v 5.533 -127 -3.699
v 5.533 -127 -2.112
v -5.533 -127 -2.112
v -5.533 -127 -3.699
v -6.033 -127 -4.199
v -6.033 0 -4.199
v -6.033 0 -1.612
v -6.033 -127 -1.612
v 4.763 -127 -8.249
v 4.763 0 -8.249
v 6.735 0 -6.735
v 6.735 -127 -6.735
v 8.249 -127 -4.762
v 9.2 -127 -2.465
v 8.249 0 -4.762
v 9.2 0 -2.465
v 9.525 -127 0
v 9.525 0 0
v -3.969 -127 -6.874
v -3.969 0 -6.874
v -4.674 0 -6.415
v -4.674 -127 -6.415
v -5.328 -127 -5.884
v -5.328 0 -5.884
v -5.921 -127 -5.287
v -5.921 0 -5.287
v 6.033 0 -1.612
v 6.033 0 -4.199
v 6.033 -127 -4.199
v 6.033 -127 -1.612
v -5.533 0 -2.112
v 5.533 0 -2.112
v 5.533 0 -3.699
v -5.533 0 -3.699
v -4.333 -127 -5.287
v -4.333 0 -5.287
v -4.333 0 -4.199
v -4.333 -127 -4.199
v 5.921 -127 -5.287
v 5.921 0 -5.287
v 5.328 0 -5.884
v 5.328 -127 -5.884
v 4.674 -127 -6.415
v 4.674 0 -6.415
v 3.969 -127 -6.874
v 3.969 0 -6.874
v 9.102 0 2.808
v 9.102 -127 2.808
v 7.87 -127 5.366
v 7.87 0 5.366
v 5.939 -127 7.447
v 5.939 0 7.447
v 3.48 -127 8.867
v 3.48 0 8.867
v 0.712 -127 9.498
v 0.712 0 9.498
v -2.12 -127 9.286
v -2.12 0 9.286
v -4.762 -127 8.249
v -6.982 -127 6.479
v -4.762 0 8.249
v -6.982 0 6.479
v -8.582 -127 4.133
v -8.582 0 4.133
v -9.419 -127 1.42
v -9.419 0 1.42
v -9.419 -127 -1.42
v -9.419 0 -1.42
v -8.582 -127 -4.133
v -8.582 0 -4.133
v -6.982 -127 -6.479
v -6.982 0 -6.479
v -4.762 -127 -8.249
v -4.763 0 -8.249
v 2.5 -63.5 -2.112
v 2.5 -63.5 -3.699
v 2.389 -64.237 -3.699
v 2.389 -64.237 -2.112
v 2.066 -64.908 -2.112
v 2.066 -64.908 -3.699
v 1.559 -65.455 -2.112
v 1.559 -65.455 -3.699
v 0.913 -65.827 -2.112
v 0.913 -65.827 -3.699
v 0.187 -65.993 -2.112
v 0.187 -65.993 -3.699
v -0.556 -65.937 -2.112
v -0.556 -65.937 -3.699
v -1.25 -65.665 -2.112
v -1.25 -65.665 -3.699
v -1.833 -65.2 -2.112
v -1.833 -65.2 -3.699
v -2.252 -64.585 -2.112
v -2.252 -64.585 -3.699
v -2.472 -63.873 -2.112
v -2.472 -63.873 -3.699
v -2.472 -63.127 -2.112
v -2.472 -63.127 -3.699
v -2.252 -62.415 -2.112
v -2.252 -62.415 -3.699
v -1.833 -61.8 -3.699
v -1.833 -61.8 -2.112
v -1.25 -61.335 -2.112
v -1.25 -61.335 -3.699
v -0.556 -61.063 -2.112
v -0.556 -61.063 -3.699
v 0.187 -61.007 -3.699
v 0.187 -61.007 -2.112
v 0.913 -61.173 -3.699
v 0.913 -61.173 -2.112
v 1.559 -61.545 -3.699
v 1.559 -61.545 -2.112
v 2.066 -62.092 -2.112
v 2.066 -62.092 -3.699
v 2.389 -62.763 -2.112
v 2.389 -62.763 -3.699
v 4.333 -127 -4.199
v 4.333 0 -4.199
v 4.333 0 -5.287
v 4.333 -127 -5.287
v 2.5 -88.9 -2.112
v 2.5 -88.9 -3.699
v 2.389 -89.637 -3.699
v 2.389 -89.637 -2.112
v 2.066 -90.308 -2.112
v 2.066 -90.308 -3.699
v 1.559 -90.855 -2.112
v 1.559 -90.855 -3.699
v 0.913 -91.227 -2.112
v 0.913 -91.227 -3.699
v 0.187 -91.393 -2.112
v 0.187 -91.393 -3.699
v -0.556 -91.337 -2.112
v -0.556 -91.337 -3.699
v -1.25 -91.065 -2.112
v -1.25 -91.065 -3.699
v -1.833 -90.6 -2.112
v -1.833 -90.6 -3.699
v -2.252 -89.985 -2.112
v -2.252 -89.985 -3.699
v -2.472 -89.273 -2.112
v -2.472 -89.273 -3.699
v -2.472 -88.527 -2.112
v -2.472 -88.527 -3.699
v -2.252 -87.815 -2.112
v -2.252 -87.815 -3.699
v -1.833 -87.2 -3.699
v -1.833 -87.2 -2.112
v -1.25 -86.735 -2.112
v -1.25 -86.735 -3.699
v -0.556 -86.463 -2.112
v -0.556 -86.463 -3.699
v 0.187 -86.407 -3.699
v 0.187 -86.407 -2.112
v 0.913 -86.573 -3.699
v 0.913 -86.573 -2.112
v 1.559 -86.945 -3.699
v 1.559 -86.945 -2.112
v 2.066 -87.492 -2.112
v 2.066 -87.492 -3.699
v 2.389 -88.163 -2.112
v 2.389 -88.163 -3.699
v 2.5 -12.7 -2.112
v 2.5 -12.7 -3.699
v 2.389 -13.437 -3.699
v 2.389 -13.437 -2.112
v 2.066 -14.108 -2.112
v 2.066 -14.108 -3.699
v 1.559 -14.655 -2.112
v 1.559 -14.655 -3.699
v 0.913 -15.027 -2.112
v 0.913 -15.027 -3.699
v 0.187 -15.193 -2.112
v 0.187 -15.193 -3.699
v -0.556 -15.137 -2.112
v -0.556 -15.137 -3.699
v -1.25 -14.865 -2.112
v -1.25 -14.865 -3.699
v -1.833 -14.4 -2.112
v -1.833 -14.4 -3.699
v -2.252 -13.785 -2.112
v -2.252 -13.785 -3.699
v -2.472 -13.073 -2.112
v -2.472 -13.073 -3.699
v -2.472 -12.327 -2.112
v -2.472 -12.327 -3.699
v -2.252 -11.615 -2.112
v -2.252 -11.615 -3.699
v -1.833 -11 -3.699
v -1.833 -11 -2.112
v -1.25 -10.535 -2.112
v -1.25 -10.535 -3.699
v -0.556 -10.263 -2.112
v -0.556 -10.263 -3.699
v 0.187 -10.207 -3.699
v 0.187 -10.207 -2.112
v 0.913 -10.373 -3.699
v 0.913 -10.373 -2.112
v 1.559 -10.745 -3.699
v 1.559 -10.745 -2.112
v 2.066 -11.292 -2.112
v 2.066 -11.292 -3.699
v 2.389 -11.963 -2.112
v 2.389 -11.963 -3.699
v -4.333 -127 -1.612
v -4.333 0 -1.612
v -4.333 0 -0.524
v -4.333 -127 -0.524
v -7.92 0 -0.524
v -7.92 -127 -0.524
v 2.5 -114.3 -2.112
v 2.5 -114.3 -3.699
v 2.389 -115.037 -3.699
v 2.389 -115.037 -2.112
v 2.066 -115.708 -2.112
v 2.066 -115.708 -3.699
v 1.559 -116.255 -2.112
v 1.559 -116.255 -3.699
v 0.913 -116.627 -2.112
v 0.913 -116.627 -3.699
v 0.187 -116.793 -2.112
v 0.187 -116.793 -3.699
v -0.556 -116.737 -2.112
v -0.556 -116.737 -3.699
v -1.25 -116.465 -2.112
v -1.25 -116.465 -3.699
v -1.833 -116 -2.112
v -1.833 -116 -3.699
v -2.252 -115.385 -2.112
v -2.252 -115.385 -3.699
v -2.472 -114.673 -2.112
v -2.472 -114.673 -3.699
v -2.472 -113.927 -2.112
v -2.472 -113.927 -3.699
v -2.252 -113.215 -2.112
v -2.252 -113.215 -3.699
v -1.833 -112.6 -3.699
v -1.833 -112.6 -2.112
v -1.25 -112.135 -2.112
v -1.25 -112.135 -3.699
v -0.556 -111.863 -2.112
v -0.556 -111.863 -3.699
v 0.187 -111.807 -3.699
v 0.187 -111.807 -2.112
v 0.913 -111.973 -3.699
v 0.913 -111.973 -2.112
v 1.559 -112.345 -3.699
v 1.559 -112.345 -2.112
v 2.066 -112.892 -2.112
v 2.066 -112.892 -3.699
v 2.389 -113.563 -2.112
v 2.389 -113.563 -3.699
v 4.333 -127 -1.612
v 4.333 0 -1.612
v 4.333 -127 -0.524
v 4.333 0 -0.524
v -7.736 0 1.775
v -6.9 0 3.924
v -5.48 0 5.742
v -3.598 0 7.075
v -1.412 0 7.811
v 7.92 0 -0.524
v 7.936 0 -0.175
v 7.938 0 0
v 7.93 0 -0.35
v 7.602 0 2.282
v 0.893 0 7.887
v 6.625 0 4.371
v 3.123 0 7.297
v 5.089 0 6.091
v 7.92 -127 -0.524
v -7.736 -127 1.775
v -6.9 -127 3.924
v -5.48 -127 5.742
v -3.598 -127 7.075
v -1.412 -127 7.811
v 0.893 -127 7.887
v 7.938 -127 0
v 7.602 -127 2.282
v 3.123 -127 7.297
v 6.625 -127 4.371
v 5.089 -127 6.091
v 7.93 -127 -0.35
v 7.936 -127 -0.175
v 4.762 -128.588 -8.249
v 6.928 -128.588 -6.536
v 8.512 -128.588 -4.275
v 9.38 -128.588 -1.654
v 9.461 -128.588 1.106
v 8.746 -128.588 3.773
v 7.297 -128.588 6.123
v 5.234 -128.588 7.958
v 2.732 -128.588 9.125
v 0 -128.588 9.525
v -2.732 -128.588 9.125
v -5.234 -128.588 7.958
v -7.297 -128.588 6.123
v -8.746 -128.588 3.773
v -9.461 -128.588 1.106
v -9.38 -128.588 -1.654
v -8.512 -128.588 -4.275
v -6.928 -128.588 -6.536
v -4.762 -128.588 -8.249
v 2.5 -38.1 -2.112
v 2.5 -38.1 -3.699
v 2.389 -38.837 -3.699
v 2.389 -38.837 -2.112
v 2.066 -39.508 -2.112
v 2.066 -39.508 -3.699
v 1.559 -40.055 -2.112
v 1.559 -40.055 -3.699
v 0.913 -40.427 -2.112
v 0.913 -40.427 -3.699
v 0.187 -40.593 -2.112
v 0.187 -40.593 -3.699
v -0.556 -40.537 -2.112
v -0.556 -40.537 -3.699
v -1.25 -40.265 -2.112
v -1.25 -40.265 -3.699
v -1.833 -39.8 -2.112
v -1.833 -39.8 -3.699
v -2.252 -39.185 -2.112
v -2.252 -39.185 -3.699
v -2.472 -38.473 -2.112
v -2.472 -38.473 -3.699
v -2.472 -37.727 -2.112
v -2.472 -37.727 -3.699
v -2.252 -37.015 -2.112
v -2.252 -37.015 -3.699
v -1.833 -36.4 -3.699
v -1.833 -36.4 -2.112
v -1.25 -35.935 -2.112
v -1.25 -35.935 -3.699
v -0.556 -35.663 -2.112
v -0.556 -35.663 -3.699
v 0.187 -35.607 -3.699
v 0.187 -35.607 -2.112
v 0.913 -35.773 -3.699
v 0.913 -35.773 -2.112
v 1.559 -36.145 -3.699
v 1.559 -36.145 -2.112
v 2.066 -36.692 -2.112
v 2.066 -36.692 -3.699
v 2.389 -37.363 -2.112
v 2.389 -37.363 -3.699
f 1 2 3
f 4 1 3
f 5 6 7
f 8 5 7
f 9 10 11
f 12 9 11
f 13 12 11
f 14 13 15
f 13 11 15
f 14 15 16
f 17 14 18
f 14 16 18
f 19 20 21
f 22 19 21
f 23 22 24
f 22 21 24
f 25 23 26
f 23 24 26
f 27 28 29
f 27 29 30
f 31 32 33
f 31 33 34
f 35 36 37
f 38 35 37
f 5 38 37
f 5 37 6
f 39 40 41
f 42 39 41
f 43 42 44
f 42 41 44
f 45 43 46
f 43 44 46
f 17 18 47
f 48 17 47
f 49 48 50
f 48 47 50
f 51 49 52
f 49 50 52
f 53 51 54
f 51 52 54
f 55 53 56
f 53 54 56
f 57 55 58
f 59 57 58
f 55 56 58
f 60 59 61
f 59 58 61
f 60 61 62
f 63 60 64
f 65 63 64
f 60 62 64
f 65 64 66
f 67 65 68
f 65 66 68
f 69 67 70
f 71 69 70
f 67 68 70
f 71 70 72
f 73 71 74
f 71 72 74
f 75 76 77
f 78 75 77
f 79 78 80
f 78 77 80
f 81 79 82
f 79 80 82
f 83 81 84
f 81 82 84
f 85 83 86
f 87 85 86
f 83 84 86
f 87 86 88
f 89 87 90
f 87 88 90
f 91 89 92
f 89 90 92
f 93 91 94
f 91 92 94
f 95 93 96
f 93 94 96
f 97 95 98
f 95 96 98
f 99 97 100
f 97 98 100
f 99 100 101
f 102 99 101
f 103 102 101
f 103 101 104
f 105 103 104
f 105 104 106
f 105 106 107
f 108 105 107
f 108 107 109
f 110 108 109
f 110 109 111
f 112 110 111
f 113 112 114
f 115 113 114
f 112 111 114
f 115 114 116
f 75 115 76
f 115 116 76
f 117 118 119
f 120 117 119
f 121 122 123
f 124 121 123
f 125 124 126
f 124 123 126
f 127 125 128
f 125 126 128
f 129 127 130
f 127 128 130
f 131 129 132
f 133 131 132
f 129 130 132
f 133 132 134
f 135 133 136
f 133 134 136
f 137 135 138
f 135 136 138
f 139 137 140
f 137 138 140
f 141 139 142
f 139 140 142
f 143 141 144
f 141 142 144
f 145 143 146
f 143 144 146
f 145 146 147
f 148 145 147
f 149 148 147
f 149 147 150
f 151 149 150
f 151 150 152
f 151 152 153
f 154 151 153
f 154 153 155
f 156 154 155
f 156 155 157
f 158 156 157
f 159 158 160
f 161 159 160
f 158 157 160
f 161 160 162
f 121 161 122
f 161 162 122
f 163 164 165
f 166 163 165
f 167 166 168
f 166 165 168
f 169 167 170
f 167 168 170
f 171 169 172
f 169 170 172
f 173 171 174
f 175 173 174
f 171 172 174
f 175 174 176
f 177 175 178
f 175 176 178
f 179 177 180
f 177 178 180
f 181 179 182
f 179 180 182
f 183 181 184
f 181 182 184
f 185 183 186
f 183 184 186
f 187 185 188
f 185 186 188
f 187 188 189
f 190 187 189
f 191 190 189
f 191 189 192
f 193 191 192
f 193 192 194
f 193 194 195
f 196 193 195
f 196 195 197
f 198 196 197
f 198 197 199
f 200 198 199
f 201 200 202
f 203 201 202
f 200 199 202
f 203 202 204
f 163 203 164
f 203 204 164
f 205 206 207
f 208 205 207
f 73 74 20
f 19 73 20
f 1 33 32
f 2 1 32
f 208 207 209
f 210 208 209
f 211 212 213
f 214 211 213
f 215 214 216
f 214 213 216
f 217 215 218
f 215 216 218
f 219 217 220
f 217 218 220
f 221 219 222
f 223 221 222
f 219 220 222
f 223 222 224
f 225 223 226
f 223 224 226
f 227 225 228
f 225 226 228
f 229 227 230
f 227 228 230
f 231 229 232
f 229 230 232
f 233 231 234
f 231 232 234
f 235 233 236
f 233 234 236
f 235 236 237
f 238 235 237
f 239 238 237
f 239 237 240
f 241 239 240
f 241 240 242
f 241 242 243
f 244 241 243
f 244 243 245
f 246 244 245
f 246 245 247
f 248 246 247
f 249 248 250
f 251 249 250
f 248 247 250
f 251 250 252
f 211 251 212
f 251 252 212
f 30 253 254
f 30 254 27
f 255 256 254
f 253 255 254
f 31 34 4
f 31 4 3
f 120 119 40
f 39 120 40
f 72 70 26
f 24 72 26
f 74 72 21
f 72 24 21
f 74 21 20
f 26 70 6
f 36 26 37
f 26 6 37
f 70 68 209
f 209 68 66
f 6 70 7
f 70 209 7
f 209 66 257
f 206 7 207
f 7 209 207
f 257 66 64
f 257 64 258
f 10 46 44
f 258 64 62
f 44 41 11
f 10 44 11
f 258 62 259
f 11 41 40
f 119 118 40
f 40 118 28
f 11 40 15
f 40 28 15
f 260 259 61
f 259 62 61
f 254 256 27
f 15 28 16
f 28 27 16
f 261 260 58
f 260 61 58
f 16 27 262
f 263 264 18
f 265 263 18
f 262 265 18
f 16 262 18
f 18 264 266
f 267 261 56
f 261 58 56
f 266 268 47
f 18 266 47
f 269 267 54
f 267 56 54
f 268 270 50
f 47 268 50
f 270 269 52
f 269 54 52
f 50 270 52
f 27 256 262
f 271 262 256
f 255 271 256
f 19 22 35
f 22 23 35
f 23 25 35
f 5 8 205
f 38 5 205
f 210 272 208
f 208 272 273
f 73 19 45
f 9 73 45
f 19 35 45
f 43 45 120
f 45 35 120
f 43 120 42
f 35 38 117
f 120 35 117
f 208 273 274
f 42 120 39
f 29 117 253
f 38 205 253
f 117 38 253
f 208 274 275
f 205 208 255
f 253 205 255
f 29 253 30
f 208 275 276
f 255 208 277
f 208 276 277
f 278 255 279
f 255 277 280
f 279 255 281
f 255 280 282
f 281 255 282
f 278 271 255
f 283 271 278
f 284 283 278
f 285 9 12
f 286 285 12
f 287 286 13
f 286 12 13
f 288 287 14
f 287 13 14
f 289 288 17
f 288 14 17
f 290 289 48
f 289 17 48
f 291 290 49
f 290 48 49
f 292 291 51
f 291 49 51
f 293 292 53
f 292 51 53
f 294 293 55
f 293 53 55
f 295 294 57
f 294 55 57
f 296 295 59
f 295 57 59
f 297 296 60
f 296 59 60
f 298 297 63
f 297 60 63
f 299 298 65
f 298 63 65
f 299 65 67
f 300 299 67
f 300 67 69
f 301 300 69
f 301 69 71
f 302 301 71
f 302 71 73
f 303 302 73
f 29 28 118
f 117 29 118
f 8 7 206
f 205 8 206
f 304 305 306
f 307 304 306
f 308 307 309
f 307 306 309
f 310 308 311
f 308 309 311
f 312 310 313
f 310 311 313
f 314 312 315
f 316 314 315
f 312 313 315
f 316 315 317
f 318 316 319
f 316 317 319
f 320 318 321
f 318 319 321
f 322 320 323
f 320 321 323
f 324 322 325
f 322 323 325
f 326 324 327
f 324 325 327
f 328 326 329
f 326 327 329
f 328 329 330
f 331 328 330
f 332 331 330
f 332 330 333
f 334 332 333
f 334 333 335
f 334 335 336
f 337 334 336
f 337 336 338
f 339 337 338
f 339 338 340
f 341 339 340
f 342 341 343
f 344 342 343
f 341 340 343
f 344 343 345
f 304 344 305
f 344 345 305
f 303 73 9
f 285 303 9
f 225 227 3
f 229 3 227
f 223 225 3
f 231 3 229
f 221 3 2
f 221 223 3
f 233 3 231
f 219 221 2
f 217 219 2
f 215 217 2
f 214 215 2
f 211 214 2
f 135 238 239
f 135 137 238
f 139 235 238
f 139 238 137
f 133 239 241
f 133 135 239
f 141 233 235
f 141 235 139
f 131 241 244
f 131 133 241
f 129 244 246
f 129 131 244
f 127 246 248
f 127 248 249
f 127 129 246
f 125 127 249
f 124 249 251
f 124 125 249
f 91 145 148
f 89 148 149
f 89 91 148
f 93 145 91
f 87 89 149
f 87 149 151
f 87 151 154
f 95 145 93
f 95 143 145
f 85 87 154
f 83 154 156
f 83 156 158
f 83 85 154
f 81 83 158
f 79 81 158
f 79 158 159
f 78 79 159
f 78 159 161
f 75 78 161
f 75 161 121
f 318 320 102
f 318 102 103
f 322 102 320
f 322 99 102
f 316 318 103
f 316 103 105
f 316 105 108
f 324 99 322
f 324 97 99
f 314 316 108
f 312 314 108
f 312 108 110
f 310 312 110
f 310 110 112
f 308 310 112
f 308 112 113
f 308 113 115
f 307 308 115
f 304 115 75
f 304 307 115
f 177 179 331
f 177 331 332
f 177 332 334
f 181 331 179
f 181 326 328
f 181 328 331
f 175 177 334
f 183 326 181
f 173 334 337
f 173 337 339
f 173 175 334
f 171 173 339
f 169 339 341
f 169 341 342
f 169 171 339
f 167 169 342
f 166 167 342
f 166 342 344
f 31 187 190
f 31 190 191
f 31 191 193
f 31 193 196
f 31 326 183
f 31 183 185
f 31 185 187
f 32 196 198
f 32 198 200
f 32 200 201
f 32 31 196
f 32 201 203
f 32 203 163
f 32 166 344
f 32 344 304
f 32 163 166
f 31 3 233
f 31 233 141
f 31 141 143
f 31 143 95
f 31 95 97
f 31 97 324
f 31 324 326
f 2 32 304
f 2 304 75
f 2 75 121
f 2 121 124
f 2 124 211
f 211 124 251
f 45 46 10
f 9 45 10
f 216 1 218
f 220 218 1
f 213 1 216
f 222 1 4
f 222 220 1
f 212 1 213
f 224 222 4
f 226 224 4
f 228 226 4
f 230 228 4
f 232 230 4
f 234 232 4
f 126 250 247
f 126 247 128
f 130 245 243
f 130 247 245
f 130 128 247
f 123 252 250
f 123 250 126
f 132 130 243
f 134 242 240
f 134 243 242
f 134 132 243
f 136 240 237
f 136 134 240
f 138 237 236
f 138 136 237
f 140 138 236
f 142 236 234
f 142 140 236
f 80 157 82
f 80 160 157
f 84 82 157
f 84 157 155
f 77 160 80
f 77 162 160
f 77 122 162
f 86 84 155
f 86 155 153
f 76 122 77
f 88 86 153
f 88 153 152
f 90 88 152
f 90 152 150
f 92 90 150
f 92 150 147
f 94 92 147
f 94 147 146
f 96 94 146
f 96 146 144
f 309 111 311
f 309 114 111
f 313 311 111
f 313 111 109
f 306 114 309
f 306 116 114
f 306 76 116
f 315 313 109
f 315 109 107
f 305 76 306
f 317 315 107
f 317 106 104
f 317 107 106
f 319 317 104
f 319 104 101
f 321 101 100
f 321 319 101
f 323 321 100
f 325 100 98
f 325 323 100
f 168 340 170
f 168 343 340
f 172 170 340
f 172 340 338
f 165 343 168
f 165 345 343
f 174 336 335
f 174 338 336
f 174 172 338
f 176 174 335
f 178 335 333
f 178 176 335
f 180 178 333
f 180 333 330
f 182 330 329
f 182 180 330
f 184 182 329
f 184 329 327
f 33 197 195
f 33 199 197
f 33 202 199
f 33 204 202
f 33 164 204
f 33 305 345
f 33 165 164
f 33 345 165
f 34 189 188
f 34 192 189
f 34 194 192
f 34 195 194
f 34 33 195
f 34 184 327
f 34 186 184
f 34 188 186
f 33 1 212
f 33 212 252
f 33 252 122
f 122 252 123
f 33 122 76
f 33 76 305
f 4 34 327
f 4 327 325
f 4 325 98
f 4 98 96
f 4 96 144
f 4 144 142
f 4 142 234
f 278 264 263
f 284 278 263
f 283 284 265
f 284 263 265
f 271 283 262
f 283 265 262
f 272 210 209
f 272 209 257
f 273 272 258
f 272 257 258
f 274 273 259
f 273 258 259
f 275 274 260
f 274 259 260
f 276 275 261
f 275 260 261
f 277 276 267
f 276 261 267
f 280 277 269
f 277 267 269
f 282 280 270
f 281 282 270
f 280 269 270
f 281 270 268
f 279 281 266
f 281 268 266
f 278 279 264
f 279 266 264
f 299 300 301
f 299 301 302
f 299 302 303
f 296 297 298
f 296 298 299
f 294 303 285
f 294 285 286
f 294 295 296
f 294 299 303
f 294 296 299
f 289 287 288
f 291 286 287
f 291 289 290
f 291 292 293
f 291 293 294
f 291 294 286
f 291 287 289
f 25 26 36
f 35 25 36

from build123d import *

# Parameters (mm, degrees)
F1_DEPTH  = 127
F2_W      = 8.6666238164
F2_H      = 1.5875
F2_W_2    = 1.2
F3_DEPTH  = 127
F4_OFFSET = 0.5
F6_DEPTH  = 1.5875
F7_R      = 2.5
F8_DEPTH  = 1.5875


with BuildPart() as f1:
    # F0 (on Front) → F1 (new body)
    with BuildSketch(Plane.XZ):
        with BuildLine():
            ThreePointArc((-7.9201799173, -0.5240766425), (-0.262181384, 7.9331687976), (7.9375, 0))
            ThreePointArc((7.9375, 0), (7.9331687976, -0.262181384), (7.9201799173, -0.5240766425))
            ThreePointArc((7.9201799173, -0.5240766425), (7.3187167756, -3.0725056564), (5.9208119082, -5.2865766425))
            ThreePointArc((5.9208119082, -5.2865766425), (5.0080832408, -6.1581660016), (3.96875, -6.8740766425))
            Line((3.96875, -6.8740766425), (4.7625, -8.248891971))
            ThreePointArc((4.7625, -8.248891971), (8.248891971, -4.7625), (9.525, 0))
            ThreePointArc((9.525, 0), (-4.7625, 8.248891971), (-4.7625, -8.248891971))
            Line((-4.7625, -8.248891971), (-3.96875, -6.8740766425))
            ThreePointArc((-3.96875, -6.8740766425), (-5.0080832408, -6.1581660016), (-5.9208119082, -5.2865766425))
            ThreePointArc((-5.9208119082, -5.2865766425), (-7.3187167756, -3.0725056564), (-7.9201799173, -0.5240766425))
        make_face()
        with BuildLine():
            Line((-4.3333119082, -0.5240766425), (-7.9201799173, -0.5240766425))
            ThreePointArc((-7.9201799173, -0.5240766425), (-7.3187167756, -3.0725056564), (-5.9208119082, -5.2865766425))
            Line((-5.9208119082, -5.2865766425), (-4.3333119082, -5.2865766425))
            Line((-4.3333119082, -5.2865766425), (-4.3333119082, -0.5240766425))
        make_face()
        with BuildLine():
            ThreePointArc((5.9208119082, -5.2865766425), (7.3187167756, -3.0725056564), (7.9201799173, -0.5240766425))
            Line((7.9201799173, -0.5240766425), (4.3333119082, -0.5240766425))
            Line((4.3333119082, -0.5240766425), (4.3333119082, -5.2865766425))
            Line((4.3333119082, -5.2865766425), (5.9208119082, -5.2865766425))
        make_face()
    extrude(amount=F1_DEPTH)


with BuildPart() as f3:
    # F2 (on face) → F3 (new body, through all)
    with BuildSketch(Plane(origin=(0, 0, 0), x_dir=(-1, 0, 0), z_dir=(0, 1, 0))):
        with Locations((0, -2.9053266425)):
            Rectangle(F2_W, F2_H)
        with Locations((-4.9333119082, -2.9053266425)):
            Rectangle(F2_W_2, F2_H)
        with Locations((4.9333119082, -2.9053266425)):
            Rectangle(F2_W_2, F2_H)
    extrude(amount=-F3_DEPTH)


with BuildPart() as f1_1:
    add(f1.part)

    # F4: cut F3, made larger all round first
    f4_tool = offset(f3.part, amount=F4_OFFSET, kind=Kind.INTERSECTION, mode=Mode.PRIVATE)
    add(f4_tool, mode=Mode.SUBTRACT)

    # F5 (on face) → F6 (join)
    with BuildSketch(Plane.XZ.offset(127)):
        with BuildLine():
            Line((-4.7625, -8.248891971), (4.7625, -8.248891971))
            ThreePointArc((4.7625, -8.248891971), (0, 9.525), (-4.7625, -8.248891971))
        make_face()
    extrude(amount=F6_DEPTH)


with BuildPart() as f3_1:
    add(f3.part)

    # F7 (on face) → F8 (cut, through all)
    with BuildSketch(Plane(origin=(0, 0, -3.6990766425), x_dir=(1, 0, 0), z_dir=(0, 0, -1))):
        with Locations((0, 12.7)):
            Circle(F7_R)
        with Locations((0, 38.1)):
            Circle(F7_R)
        with Locations((0, 63.5)):
            Circle(F7_R)
        with Locations((0, 88.9)):
            Circle(F7_R)
        with Locations((0, 114.3)):
            Circle(F7_R)
    extrude(amount=-F8_DEPTH, mode=Mode.SUBTRACT)


solid = Compound([f1_1.part, f3_1.part])
